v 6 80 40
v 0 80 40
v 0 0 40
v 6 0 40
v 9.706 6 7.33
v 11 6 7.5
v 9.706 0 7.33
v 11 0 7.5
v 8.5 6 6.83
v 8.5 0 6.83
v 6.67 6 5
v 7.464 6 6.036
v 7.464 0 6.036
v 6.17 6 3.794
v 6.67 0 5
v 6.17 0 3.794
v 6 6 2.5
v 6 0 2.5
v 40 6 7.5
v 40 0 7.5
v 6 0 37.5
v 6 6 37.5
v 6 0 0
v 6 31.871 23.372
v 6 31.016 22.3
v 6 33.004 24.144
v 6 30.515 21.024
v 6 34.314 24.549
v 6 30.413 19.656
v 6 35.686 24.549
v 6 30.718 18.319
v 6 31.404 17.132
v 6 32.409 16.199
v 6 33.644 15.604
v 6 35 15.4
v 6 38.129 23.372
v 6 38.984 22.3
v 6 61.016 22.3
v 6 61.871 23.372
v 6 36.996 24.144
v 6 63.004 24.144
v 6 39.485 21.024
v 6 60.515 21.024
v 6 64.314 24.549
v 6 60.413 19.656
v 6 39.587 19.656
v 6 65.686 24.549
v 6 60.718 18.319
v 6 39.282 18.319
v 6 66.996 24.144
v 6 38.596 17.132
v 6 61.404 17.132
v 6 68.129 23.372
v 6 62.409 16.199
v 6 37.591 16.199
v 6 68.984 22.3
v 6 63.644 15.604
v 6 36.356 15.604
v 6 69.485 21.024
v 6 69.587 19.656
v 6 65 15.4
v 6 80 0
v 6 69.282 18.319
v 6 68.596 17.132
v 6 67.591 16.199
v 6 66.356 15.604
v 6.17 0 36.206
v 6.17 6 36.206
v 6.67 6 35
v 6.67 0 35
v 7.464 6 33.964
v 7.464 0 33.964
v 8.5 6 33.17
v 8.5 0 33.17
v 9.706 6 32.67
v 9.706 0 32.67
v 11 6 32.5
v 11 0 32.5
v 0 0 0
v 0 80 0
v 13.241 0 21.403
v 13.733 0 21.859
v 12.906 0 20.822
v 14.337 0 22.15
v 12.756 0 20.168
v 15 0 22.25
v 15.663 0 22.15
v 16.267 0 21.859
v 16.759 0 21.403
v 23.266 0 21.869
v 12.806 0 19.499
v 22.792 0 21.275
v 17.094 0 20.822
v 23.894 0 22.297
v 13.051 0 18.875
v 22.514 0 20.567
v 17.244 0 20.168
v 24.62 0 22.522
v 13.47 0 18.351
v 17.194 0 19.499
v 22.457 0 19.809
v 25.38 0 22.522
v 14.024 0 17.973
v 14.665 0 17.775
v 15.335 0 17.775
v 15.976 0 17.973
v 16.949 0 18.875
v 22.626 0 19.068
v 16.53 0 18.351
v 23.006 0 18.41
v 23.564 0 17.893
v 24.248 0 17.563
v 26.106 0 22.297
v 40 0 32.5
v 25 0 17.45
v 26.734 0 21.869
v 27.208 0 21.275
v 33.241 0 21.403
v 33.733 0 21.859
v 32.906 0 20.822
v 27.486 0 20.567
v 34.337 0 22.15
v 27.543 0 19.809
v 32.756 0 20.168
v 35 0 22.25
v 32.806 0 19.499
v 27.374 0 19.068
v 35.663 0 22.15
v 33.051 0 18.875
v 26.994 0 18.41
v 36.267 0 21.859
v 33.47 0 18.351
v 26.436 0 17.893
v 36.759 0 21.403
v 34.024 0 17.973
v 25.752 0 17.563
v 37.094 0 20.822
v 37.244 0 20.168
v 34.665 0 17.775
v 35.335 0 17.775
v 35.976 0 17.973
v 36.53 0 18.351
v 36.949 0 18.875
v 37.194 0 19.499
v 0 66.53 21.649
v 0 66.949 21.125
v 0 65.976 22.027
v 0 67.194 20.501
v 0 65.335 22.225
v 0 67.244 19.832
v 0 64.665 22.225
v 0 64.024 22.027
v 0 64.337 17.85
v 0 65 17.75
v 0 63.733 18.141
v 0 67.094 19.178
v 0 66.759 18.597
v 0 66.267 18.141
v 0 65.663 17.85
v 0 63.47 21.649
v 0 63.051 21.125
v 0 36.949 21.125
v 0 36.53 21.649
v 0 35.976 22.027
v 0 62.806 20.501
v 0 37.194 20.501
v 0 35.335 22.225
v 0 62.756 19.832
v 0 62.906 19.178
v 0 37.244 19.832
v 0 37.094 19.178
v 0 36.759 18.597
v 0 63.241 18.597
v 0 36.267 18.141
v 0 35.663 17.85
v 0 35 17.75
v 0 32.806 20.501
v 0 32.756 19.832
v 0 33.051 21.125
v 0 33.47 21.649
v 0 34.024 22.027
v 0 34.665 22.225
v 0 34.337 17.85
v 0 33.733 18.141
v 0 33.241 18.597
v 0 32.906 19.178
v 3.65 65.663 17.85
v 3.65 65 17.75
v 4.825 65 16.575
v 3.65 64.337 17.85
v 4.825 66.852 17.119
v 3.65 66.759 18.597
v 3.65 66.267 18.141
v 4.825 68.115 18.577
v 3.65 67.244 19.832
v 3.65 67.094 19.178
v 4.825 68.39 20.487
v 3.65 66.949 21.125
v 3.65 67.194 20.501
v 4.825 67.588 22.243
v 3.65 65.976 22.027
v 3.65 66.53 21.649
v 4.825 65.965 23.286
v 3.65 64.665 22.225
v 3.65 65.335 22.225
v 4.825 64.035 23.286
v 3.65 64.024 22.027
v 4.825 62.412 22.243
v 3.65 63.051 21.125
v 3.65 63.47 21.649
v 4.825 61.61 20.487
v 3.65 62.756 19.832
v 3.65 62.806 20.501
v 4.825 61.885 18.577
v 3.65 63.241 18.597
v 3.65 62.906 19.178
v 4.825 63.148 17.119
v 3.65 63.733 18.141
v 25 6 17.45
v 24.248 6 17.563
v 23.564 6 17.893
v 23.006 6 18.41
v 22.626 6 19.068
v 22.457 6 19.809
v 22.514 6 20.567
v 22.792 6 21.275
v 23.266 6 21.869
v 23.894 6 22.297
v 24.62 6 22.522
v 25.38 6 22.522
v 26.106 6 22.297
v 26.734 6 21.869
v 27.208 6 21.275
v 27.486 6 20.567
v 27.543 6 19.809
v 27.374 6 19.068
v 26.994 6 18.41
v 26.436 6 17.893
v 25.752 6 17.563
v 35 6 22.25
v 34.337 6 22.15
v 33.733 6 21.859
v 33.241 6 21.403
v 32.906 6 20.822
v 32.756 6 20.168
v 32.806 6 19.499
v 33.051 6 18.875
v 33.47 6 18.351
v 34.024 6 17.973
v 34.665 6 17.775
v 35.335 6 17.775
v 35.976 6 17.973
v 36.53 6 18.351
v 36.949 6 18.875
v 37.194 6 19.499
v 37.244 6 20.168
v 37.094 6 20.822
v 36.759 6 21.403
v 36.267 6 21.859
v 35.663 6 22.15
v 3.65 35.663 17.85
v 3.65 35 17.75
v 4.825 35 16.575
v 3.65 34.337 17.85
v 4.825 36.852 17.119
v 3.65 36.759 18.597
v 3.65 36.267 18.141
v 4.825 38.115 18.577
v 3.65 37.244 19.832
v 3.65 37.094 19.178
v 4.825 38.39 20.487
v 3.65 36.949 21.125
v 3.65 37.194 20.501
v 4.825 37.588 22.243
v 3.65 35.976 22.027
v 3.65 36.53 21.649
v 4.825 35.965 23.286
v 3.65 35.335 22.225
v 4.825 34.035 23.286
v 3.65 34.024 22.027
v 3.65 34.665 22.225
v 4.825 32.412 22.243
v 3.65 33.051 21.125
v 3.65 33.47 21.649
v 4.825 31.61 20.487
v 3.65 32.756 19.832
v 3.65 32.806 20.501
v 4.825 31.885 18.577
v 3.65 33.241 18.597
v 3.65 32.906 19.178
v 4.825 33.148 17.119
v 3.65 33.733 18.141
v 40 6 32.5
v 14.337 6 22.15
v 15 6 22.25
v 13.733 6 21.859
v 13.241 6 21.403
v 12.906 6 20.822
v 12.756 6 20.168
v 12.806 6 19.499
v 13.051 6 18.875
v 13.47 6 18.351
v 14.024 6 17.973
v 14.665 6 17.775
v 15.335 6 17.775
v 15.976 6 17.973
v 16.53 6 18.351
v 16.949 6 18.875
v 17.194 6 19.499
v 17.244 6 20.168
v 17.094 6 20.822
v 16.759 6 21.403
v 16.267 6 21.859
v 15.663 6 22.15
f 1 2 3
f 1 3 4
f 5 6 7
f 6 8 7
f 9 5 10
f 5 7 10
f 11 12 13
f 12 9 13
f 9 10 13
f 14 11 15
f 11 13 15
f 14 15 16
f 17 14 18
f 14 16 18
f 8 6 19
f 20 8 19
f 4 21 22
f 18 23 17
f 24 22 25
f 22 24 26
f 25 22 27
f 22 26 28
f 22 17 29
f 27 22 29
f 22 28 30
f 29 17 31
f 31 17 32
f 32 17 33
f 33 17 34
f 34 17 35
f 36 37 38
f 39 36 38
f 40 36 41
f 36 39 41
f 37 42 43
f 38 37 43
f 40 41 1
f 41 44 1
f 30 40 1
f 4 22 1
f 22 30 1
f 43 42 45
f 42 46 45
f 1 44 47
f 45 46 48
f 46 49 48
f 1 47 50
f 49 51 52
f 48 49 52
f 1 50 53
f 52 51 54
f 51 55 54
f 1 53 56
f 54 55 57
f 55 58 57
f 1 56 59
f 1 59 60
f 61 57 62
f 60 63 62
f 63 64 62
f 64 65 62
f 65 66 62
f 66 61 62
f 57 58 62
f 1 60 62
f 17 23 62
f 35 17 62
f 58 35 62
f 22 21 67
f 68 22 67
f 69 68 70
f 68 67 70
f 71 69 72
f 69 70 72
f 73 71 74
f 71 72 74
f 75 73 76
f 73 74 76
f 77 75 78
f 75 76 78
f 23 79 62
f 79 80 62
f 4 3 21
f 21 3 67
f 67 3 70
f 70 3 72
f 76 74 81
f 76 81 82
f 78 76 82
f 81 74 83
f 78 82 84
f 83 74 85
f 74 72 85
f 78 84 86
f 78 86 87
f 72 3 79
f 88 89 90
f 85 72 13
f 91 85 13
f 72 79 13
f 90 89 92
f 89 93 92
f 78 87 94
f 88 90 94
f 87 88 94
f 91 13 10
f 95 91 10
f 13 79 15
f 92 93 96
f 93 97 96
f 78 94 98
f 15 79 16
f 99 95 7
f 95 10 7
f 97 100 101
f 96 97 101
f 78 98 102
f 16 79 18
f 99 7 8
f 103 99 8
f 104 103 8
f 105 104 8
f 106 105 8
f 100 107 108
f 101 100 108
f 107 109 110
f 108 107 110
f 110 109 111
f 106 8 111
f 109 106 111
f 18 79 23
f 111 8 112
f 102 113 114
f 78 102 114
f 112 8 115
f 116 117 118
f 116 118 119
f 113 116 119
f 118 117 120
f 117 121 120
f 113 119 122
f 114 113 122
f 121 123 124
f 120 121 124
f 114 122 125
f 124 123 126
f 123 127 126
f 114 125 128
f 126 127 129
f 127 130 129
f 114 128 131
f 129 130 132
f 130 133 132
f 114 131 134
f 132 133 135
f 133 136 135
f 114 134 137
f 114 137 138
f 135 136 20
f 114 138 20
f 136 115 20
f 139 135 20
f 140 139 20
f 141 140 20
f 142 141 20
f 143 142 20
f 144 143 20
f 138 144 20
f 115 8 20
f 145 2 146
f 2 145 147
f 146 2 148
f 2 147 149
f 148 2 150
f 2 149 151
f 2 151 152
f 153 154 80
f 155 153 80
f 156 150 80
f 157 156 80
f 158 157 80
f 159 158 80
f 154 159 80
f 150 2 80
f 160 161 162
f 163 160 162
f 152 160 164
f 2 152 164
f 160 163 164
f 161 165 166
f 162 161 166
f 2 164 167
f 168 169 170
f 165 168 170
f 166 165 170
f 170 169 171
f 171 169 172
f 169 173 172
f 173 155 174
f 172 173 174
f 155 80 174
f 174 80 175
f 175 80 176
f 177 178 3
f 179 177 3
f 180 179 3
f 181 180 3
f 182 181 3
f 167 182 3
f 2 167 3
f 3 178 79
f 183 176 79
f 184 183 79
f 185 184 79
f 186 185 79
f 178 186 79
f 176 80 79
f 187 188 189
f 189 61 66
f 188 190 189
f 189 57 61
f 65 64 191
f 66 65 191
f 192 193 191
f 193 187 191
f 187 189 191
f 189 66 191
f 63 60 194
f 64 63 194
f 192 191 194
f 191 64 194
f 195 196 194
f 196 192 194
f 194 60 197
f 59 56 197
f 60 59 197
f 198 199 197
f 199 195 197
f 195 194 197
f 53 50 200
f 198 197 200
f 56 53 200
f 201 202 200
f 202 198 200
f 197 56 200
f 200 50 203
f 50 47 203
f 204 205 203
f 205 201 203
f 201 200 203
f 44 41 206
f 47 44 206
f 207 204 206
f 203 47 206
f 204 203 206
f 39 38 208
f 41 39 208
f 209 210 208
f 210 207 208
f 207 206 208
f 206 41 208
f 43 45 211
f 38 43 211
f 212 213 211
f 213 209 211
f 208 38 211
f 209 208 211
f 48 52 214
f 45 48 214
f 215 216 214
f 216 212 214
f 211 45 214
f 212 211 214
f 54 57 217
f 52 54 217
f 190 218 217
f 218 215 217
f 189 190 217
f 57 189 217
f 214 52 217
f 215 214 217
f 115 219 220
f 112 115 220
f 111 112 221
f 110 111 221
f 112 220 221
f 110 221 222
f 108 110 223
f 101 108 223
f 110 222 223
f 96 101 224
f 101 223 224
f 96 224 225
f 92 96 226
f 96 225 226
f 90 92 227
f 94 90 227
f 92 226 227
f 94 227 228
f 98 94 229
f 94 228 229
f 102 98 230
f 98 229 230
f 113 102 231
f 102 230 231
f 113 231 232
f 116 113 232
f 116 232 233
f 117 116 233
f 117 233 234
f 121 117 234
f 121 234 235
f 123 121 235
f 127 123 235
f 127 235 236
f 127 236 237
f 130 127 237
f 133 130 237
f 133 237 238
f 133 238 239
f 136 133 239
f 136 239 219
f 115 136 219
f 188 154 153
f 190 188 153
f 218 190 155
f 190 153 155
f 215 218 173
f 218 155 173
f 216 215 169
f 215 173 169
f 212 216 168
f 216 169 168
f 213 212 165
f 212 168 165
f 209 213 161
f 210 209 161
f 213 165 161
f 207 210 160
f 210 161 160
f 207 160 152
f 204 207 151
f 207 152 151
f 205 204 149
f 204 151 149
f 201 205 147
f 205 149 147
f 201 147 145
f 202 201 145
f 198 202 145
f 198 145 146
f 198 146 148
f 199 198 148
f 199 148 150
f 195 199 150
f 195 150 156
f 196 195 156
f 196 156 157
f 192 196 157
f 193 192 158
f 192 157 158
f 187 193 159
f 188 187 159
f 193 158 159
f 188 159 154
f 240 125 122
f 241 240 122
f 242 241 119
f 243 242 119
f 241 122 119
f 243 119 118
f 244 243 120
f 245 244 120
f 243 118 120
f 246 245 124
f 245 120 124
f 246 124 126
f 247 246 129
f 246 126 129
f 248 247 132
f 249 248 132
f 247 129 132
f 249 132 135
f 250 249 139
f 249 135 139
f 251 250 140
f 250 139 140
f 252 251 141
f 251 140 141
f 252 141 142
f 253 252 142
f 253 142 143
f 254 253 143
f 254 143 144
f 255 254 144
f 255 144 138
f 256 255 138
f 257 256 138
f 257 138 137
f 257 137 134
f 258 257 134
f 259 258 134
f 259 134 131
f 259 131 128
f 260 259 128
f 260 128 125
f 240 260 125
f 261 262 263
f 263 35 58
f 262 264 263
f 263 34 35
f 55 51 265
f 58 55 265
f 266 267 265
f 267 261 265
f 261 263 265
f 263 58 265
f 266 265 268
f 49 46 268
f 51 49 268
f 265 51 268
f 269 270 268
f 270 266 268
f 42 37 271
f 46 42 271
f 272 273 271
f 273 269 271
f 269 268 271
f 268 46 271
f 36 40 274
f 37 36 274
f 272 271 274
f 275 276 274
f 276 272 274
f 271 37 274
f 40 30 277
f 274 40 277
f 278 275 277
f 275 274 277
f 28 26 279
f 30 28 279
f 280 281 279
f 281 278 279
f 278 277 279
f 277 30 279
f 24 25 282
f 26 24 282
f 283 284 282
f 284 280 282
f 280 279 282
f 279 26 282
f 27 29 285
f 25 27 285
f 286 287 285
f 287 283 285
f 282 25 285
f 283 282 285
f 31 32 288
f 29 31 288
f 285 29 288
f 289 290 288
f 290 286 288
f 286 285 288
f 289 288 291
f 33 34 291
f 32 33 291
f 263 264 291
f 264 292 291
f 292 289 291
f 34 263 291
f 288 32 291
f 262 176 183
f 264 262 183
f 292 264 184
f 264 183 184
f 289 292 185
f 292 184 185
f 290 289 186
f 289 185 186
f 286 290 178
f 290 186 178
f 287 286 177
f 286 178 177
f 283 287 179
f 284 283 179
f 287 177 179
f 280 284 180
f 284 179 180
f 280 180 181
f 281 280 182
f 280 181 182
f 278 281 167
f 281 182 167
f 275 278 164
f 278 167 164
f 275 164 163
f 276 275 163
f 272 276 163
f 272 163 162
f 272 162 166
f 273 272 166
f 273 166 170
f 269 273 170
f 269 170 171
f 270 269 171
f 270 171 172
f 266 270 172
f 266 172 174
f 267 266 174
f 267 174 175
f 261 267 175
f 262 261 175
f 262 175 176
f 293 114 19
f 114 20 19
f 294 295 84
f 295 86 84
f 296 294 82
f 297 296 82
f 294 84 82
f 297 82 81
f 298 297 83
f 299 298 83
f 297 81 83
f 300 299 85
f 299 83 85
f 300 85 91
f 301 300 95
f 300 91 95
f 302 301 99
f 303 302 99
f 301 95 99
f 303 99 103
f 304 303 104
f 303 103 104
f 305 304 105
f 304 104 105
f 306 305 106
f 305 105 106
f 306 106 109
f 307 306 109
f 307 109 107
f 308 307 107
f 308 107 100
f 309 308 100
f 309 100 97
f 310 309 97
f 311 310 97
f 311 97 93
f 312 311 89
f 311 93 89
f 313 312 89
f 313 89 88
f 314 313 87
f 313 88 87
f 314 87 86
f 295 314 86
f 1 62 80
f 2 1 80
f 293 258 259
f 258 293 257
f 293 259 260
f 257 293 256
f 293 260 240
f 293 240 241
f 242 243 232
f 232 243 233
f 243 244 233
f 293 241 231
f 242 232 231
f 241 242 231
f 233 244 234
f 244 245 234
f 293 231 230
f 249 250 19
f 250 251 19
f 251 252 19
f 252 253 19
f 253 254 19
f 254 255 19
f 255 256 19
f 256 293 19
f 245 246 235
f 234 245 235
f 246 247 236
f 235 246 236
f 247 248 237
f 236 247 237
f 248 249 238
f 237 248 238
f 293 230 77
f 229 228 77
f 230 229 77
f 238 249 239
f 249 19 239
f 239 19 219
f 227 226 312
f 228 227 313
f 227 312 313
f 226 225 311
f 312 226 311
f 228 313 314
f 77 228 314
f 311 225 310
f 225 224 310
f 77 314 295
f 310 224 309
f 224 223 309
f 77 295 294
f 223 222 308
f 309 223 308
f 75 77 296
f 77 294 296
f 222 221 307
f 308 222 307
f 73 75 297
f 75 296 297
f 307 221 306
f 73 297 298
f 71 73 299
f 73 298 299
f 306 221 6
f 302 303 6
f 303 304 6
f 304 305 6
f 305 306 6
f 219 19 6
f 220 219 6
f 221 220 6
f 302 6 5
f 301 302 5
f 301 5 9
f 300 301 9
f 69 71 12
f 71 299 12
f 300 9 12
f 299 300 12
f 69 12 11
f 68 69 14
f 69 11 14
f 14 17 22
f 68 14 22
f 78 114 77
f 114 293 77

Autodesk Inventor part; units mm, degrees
ref_plane "YZ Plane" through (0, 0, 0) normal (1, 0, 0) x (0, 1, 0)
ref_plane "XZ Plane" through (0, 0, 0) normal (0, 1, 0) x (-1, 0, 0)
ref_plane "XY Plane" through (0, 0, 0) normal (0, 0, 1) x (1, 0, 0)
sketch "Skizze1" plane through (0, 0, 0) normal (0, 0, 1) x (1, 0, 0)
  line L0 (0, 0) -> (2.7641, 0)
  line L1 (6, 6) -> (6, 80)
  line L2 (6, 80) -> (0, 80)
  line L3 (0, 80) -> (0, 0)
  line L4 (-8, 0) -> (48, 0) projected
  line L5 (0, -16) -> (0, 96) projected
  line L6 (0, 0) -> (40, 0)
  line L7 (40, 0) -> (40, 6)
  line L8 (40, 6) -> (6, 6)
  line L9 (0, 2.8256) -> (0, 0)
  dimension "d0" = 80
  dimension "d1" = 40
  dimension "d2" = 6
extrude "Extrusion1" add sketch "Skizze1" along normal blind 40
sketch "Skizze2" plane through (6, 6, 0) normal (0, 1, 0) x (1, 0, 0)
  line L0 (34, 0) -> (34, -40) projected
  line L1 (0, 0) -> (0, -40) projected
  line L2 (0, -20) -> (34, -20)
  line L3 (0, -7.5) -> (34, -7.5)
  line L4 (34, -7.5) -> (34, -32.5)
  line L5 (34, -32.5) -> (0, -32.5)
  line L6 (0, -32.5) -> (0, -7.5)
  line L7 (34, -7.5) -> (0, -7.5)
  line L8 (0, -7.5) -> (0, 0)
  line L9 (0, 0) -> (34, 0)
  line L10 (34, 0) -> (34, -7.5)
  line L11 (34, -40) -> (0, -40)
  line L12 (0, -40) -> (0, -32.5)
  line L13 (0, -32.5) -> (34, -32.5)
  line L14 (34, -32.5) -> (34, -40)
  point P0 (-6, 0)
  dimension "d5" = 25
extrude "Extrusion2" cut sketch "Skizze2" against normal through all contours L0 L3 L1 L9 | L0 L11 L1 L5
sketch "Skizze3" plane through (0, 0, 0) normal (-1, 0, 0) x (0, 0, 1)
  line L0 (0, 80) -> (40, 80) projected
  line L1 (0, 0) -> (40, 0) projected
  line L2 (20, 80) -> (20, 0)
  point P0 (20, 65)
  point P1 (20, 35)
  dimension "d8" = 15
  dimension "d9" = 30
hole "Bohrung1" at (0, 65, 20) at (0, 35, 20) direction (1, 0, 0) diameter 4 end through all
sketch "Skizze4" plane through (6, 6, 32.5) normal (0, 1, 0) x (1, 0, 0)
  line L0 (34, 25) -> (34, 0) projected
  line L1 (0, 25) -> (0, 0) projected
  line L2 (34, 12.5) -> (0, 12.5)
  point P0 (-6, 32.5)
  point P1 (29, 12.5)
  point P2 (9, 12.5)
  dimension "d17" = 20
  dimension "d59" = 5
hole "Bohrung2" at (35, 6, 20) at (15, 6, 20) direction (0, -1, 0) diameter 4.5 end through all
sketch "Skizze5" plane through (0, 0, 0) normal (0, -1, 0) x (1, 0, 0)
  circle A0 centre (15, 20) radius 2.25 projected
  circle A1 centre (35, 20) radius 2.25 projected
  line L0 (40, 32.5) -> (6, 32.5) projected
  line L1 (6, 32.5) -> (6, 7.5)
  line L2 (15, 20) -> (35, 20)
  line L3 (40, 7.5) -> (40, 32.5) projected
  line L4 (25, 20) -> (25, 16.5238)
  dimension "d60" = 10
  dimension "d61" = 10
hole "Bohrung4" at (25, 0, 20) direction (0, 1, 0) diameter 5.1 end through all
fillet "Rundung1" radius 5 2 edges at (6, 3, 7.5) (6, 3, 32.5)
sketch "Skizze7" plane through (6, 0, 0) normal (1, 0, 0) x (0, 0, -1)
  circle A0 centre (-20, 65) radius 2 projected
  circle A1 centre (-20, 35) radius 2 projected
hole "Bohrung7" at (6, 65, 20) at (6, 35, 20) direction (-1, 0, 0) diameter 4.5 end through all countersink diameter 9.2 countersink angle 90
properties part number "1_0204_006"
